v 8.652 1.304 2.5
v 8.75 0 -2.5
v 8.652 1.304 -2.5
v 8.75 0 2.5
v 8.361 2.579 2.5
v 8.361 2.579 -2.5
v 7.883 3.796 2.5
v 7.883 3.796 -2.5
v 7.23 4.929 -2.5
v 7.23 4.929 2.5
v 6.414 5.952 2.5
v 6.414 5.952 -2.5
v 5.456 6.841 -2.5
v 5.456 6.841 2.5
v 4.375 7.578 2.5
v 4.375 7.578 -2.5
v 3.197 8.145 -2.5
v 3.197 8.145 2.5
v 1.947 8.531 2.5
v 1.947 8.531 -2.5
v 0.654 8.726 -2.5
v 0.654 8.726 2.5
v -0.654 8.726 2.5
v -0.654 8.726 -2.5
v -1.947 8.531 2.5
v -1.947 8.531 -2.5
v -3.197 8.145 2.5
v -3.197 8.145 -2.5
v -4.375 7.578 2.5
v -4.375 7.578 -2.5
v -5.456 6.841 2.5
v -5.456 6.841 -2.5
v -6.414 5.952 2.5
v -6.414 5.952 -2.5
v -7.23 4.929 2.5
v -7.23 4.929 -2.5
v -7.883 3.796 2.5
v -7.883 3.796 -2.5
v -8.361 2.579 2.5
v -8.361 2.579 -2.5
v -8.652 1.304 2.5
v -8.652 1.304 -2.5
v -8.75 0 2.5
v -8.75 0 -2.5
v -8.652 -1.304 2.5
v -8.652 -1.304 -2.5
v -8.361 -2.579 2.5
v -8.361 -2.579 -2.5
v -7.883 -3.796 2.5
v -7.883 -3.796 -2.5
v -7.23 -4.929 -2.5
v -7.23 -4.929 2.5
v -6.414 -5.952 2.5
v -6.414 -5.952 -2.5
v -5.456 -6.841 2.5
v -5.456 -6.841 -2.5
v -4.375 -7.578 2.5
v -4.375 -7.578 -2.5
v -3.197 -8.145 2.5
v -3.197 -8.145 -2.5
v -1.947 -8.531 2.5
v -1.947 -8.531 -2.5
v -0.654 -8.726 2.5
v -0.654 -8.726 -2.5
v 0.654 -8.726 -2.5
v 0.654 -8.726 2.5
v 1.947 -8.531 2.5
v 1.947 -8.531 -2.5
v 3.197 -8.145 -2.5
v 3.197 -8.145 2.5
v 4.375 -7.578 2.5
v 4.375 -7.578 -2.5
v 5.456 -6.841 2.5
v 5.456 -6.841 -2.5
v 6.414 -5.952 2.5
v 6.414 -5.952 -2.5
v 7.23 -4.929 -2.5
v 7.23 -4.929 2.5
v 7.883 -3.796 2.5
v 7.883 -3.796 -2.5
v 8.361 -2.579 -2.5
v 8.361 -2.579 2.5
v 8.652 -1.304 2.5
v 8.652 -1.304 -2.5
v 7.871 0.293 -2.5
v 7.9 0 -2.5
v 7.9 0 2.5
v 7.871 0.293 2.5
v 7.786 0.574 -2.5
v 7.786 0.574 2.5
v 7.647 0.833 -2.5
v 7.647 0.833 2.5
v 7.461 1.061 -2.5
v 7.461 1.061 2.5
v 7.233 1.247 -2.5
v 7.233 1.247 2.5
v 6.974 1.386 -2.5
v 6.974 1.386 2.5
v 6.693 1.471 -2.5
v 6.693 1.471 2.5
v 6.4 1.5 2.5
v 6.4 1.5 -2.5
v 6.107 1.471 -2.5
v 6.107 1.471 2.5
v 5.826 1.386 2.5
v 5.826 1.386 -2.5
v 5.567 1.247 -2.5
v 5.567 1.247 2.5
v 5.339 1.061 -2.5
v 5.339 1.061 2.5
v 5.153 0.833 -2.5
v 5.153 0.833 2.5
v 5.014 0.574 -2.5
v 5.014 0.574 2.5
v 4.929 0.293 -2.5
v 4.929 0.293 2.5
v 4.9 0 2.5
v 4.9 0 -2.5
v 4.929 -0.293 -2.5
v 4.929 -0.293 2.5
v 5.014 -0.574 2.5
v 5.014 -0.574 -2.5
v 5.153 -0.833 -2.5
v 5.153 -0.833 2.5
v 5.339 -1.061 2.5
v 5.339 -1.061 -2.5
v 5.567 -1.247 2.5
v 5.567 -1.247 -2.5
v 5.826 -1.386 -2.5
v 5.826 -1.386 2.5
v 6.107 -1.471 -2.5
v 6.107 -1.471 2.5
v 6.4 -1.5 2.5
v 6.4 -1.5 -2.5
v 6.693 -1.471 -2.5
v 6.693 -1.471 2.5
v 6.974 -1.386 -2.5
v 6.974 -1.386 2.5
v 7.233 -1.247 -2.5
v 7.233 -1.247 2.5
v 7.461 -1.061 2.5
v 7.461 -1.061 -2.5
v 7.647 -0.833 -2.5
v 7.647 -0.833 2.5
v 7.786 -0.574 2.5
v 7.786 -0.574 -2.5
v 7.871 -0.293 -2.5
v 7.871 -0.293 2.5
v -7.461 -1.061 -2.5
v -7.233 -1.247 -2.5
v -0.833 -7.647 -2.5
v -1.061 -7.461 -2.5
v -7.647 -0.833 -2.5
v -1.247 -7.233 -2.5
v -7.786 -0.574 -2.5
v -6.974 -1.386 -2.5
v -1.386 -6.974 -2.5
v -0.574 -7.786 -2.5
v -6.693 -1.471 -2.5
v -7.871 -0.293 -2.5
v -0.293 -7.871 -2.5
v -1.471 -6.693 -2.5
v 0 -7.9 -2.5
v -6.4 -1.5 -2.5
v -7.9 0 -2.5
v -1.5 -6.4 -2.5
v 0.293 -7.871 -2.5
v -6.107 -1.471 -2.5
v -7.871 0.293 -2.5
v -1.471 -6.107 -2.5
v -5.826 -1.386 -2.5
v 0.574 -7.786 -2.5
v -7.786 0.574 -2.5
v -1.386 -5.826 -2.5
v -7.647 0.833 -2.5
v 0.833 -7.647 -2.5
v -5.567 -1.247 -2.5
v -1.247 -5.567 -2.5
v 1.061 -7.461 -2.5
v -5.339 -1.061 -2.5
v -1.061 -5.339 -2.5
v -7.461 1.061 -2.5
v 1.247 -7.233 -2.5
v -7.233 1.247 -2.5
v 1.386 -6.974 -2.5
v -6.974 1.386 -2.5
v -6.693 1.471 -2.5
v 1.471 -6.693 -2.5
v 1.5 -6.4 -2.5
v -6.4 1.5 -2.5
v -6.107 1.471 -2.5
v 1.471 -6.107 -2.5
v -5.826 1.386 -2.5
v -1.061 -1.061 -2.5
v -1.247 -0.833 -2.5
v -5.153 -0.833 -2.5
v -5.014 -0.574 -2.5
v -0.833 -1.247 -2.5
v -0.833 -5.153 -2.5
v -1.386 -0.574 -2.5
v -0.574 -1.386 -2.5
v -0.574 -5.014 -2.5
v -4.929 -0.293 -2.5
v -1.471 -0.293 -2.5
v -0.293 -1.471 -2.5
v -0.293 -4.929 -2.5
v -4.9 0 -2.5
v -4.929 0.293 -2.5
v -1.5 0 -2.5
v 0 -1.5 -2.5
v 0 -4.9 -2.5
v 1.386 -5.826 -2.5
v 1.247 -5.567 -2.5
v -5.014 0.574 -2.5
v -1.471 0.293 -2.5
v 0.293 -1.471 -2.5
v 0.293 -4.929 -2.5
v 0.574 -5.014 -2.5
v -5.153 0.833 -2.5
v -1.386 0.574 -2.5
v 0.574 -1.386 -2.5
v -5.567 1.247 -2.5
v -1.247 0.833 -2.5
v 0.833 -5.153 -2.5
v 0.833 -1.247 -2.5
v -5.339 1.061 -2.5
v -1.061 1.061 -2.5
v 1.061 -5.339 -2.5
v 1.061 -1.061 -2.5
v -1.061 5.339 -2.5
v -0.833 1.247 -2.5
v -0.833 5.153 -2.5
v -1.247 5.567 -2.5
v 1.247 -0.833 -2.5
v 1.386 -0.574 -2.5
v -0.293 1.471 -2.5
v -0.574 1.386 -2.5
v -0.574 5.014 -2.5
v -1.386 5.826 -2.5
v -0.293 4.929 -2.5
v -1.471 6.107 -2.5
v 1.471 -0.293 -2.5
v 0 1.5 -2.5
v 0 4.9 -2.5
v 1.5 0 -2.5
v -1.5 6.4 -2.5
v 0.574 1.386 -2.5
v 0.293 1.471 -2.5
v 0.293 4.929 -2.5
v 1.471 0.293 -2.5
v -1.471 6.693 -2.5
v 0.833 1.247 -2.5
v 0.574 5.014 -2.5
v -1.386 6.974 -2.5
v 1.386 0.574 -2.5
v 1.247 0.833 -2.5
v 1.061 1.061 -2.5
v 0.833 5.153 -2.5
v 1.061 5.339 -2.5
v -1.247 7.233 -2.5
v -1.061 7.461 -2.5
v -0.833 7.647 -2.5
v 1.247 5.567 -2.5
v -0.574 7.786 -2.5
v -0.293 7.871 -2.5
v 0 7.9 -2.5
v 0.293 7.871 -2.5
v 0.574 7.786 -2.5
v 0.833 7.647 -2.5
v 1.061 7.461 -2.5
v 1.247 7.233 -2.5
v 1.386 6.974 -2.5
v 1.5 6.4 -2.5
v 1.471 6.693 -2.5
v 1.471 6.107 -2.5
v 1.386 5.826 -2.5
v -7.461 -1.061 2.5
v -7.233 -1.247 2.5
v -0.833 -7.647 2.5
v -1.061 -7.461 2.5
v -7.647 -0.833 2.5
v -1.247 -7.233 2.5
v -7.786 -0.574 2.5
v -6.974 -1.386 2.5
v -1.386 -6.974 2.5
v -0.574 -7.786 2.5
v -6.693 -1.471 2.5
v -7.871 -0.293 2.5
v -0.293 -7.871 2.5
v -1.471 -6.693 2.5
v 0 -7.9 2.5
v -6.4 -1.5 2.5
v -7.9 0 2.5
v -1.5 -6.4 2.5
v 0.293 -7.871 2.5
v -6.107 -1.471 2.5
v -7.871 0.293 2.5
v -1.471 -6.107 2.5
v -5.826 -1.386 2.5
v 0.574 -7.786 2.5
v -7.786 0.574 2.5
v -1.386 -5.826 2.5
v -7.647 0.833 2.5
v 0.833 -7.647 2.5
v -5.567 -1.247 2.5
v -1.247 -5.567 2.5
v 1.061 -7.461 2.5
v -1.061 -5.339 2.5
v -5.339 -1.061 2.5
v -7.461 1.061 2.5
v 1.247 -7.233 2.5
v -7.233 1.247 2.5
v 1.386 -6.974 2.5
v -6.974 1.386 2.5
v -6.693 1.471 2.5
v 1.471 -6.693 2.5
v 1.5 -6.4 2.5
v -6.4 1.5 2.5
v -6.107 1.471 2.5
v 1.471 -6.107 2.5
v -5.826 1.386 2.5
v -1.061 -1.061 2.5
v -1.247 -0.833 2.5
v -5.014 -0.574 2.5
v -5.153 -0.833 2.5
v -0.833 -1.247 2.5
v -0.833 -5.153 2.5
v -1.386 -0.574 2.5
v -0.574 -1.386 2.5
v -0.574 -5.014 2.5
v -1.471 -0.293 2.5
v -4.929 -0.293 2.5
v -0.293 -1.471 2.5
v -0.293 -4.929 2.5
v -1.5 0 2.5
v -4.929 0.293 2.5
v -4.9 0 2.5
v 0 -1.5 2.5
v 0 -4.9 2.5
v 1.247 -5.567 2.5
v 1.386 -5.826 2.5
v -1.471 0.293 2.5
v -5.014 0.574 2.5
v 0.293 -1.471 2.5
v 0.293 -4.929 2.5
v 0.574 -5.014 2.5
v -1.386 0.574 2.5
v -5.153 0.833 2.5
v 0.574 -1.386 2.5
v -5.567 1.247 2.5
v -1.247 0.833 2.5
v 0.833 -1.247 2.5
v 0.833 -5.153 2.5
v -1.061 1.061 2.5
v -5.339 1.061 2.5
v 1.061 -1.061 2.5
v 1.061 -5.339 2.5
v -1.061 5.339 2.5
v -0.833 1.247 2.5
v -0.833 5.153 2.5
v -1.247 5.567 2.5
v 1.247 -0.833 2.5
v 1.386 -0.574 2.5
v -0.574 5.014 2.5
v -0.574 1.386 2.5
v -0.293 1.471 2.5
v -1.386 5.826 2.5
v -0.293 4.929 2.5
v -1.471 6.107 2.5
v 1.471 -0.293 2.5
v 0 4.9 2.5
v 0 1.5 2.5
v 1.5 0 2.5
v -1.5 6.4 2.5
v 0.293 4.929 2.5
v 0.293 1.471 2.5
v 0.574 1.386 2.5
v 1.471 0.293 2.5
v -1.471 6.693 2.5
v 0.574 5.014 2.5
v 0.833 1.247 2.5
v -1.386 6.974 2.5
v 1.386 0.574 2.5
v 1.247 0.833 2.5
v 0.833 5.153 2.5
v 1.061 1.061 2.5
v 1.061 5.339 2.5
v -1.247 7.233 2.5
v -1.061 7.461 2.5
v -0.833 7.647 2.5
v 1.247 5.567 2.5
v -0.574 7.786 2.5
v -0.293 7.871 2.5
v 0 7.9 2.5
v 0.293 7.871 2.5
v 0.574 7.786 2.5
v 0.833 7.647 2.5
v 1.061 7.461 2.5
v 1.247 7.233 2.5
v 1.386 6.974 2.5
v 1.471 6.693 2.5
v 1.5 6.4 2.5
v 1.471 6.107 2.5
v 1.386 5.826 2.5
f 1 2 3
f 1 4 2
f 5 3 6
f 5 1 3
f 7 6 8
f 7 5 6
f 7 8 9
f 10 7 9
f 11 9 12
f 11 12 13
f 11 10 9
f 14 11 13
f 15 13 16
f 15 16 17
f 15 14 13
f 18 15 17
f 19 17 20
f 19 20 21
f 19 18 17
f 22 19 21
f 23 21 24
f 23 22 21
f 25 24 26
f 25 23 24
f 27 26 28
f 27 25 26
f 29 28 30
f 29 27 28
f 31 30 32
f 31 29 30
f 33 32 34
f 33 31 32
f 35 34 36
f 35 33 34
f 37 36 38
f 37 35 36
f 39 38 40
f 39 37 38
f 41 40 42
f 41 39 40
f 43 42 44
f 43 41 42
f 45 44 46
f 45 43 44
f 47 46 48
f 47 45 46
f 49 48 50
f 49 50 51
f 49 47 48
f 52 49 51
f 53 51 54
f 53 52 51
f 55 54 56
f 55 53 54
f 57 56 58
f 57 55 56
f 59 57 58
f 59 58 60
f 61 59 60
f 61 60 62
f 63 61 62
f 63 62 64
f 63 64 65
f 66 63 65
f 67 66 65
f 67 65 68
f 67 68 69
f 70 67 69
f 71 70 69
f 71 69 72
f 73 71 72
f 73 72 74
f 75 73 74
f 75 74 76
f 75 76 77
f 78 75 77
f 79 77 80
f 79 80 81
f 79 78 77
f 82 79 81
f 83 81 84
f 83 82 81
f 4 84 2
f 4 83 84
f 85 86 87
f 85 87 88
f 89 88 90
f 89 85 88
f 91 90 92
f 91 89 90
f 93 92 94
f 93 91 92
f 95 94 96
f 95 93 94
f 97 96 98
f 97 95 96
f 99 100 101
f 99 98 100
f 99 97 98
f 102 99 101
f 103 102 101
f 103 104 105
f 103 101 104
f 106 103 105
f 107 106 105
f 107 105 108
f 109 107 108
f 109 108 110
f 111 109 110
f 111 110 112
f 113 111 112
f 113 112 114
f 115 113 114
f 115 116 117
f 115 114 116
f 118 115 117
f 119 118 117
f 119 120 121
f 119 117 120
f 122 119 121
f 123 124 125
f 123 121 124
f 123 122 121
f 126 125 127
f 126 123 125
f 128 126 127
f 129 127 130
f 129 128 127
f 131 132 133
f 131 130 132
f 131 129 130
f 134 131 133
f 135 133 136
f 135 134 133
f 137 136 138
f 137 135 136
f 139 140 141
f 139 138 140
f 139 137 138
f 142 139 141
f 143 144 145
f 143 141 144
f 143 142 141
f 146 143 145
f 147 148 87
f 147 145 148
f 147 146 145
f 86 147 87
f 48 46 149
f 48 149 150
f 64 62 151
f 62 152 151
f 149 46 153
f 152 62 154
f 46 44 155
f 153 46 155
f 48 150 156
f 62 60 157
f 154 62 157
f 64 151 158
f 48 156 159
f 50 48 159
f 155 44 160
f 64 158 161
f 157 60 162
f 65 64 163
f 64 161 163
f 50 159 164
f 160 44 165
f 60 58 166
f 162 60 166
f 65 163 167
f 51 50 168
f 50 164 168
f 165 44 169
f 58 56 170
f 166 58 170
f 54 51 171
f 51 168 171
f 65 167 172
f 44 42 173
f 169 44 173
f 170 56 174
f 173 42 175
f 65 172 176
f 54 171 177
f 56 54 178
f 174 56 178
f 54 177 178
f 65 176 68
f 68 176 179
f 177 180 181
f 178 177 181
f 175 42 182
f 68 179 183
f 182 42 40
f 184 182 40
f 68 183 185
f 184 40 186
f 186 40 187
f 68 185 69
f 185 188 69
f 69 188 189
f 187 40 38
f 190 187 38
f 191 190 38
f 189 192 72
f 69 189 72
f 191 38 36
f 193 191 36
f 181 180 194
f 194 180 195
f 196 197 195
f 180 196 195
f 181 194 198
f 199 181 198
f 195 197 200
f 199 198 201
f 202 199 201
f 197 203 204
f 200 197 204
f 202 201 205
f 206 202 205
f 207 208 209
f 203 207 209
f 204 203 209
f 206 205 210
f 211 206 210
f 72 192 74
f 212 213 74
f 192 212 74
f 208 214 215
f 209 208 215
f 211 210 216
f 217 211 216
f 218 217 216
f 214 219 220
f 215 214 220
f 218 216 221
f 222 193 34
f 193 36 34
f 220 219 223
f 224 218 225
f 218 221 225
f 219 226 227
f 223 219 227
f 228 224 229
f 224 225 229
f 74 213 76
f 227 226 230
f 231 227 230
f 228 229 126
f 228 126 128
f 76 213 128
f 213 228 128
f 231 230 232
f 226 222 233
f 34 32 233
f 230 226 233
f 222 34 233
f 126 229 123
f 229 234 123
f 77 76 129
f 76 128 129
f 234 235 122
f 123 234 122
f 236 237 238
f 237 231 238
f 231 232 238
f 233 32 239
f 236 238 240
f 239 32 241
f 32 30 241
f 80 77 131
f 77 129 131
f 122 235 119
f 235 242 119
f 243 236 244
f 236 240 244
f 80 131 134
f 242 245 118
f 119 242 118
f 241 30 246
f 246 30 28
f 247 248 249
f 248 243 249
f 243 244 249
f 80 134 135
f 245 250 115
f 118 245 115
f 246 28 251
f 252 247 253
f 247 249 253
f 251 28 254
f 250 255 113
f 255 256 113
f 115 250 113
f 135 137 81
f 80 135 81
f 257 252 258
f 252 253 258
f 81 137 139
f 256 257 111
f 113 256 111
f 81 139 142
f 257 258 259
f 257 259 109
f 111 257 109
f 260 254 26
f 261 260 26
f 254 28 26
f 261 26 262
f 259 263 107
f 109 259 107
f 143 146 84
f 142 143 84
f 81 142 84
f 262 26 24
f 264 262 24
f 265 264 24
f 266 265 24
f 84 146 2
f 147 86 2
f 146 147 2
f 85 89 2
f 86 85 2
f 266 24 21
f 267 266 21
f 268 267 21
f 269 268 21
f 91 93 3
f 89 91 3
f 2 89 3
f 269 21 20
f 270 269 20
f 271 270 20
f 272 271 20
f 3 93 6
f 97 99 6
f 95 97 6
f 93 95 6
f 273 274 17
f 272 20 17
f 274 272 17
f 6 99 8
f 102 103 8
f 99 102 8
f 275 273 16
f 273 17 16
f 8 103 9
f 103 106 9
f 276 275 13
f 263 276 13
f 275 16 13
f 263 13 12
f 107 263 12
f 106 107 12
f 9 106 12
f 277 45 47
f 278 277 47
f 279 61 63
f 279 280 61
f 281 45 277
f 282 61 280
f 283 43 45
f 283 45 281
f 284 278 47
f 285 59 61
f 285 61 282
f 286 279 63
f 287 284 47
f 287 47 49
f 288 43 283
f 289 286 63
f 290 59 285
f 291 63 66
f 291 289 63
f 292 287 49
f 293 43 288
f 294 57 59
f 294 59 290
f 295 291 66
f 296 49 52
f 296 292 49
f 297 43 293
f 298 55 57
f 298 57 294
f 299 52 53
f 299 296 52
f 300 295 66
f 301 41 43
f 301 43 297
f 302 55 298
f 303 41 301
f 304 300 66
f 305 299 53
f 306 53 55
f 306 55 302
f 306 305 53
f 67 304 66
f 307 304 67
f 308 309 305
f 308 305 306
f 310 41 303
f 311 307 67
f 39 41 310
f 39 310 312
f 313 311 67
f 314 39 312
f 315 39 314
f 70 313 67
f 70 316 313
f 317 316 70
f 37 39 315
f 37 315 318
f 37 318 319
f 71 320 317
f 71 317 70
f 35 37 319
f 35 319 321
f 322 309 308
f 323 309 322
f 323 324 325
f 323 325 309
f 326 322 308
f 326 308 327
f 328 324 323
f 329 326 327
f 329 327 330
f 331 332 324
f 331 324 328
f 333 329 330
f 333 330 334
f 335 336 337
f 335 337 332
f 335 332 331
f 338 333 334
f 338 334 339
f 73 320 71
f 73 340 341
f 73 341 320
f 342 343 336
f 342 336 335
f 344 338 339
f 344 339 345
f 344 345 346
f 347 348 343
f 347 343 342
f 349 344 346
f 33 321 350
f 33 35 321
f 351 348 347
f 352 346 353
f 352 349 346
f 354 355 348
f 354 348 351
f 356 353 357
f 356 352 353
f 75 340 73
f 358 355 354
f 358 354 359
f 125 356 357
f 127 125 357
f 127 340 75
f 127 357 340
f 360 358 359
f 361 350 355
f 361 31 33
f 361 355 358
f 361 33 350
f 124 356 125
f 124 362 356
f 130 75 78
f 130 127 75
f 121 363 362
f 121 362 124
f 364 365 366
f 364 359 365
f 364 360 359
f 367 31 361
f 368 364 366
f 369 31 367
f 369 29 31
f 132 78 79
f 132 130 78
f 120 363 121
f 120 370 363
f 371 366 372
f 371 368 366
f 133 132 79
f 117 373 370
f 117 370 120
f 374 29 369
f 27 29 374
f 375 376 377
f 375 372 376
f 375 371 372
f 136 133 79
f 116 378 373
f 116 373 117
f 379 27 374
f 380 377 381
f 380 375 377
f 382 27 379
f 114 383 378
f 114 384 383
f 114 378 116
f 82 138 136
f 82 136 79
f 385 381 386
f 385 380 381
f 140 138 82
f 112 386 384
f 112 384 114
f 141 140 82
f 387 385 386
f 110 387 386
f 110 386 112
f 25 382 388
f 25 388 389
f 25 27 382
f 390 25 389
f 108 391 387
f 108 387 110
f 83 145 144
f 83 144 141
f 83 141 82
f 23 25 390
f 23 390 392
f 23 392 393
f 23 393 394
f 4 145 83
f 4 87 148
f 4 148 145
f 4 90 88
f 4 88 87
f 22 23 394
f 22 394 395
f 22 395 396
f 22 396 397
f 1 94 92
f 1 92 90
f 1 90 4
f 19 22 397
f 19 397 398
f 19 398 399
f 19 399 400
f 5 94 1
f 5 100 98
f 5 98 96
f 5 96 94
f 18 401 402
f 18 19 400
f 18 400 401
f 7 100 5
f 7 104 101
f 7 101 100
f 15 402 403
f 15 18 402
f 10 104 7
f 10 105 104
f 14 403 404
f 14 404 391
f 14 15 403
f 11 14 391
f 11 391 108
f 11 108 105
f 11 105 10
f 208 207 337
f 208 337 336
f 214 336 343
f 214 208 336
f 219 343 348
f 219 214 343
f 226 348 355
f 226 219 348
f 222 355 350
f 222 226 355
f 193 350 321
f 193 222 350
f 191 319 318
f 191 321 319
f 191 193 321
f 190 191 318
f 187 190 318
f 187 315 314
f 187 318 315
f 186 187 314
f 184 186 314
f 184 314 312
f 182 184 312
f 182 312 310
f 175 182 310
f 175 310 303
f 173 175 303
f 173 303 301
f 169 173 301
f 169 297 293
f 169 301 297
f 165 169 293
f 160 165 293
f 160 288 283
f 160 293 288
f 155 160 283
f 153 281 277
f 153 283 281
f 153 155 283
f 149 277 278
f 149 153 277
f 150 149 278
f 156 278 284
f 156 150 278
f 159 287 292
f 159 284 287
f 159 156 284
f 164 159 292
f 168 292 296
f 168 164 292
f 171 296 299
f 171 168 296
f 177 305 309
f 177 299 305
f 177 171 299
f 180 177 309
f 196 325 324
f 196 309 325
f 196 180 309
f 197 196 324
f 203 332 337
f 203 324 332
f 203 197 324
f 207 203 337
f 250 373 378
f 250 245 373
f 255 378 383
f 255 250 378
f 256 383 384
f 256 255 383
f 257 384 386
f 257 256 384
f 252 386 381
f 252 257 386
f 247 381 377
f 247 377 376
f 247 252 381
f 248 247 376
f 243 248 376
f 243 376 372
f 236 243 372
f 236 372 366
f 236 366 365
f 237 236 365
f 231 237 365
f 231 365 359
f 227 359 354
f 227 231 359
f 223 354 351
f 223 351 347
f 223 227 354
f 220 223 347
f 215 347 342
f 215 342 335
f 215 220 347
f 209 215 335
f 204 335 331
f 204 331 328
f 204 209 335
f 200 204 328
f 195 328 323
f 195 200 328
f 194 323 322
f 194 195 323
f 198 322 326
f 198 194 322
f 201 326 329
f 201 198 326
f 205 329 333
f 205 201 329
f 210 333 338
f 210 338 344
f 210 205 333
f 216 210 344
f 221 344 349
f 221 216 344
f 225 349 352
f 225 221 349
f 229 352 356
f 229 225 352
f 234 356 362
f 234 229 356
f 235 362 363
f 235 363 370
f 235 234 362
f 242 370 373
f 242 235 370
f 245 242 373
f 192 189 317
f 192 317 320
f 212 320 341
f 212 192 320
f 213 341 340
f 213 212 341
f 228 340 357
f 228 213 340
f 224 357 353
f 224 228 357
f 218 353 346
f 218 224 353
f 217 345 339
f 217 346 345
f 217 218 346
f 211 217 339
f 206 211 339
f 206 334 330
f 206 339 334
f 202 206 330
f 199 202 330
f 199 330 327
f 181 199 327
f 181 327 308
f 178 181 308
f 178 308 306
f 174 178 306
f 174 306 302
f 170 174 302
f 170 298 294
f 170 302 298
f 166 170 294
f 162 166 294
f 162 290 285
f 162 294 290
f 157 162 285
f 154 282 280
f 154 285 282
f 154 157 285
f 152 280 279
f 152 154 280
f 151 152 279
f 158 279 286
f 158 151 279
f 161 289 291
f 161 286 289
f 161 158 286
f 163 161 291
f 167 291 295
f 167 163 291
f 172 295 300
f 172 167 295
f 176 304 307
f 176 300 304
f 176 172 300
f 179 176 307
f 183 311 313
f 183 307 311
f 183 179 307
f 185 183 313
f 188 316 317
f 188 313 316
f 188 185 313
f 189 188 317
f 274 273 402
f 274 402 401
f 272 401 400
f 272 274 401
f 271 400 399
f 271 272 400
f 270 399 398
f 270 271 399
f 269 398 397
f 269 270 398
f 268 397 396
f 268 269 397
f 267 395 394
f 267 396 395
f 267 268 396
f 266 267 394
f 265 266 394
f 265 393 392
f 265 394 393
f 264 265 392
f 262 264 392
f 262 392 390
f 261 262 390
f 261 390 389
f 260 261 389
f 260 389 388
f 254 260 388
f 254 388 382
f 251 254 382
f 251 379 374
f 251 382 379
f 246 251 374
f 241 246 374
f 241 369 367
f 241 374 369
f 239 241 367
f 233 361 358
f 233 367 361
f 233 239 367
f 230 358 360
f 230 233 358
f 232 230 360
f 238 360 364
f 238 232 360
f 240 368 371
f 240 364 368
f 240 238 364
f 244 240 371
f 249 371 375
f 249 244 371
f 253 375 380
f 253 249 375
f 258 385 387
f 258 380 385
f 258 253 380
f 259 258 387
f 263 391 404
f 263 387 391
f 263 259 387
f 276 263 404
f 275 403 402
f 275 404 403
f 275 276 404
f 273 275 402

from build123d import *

# Parameters (mm, degrees)
SKETCH1_R           = 8.75
SKETCH1_R_2         = 1.5
EXTRUDE1_DEPTH      = 2.5
EXTRUDE2_DEPTH      = 13.624381173
EXTRUDE2_DEPTH_BACK = 13.624381173
SKETCH2_R           = 1.5


with BuildPart() as part:
    # Sketch1 → Extrude1 (new, symmetric)
    with BuildSketch(Plane.XY):
        Circle(SKETCH1_R)
        Circle(SKETCH1_R_2, mode=Mode.SUBTRACT)
    extrude(amount=EXTRUDE1_DEPTH, both=True)

    # Sketch2 → Extrude2 (cut, two sides: drawn at the far end of the back side and taken through both)
    with BuildSketch(Plane.XY.offset(-EXTRUDE2_DEPTH_BACK)):
        with Locations((0, 6.4)):
            Circle(SKETCH2_R)
        with Locations((6.4, 0)):
            Circle(SKETCH2_R)
        with Locations((0, -6.4)):
            Circle(SKETCH2_R)
        with Locations((-6.4, 0)):
            Circle(SKETCH2_R)
    extrude(amount=EXTRUDE2_DEPTH + EXTRUDE2_DEPTH_BACK, mode=Mode.SUBTRACT)


solid = part.part
